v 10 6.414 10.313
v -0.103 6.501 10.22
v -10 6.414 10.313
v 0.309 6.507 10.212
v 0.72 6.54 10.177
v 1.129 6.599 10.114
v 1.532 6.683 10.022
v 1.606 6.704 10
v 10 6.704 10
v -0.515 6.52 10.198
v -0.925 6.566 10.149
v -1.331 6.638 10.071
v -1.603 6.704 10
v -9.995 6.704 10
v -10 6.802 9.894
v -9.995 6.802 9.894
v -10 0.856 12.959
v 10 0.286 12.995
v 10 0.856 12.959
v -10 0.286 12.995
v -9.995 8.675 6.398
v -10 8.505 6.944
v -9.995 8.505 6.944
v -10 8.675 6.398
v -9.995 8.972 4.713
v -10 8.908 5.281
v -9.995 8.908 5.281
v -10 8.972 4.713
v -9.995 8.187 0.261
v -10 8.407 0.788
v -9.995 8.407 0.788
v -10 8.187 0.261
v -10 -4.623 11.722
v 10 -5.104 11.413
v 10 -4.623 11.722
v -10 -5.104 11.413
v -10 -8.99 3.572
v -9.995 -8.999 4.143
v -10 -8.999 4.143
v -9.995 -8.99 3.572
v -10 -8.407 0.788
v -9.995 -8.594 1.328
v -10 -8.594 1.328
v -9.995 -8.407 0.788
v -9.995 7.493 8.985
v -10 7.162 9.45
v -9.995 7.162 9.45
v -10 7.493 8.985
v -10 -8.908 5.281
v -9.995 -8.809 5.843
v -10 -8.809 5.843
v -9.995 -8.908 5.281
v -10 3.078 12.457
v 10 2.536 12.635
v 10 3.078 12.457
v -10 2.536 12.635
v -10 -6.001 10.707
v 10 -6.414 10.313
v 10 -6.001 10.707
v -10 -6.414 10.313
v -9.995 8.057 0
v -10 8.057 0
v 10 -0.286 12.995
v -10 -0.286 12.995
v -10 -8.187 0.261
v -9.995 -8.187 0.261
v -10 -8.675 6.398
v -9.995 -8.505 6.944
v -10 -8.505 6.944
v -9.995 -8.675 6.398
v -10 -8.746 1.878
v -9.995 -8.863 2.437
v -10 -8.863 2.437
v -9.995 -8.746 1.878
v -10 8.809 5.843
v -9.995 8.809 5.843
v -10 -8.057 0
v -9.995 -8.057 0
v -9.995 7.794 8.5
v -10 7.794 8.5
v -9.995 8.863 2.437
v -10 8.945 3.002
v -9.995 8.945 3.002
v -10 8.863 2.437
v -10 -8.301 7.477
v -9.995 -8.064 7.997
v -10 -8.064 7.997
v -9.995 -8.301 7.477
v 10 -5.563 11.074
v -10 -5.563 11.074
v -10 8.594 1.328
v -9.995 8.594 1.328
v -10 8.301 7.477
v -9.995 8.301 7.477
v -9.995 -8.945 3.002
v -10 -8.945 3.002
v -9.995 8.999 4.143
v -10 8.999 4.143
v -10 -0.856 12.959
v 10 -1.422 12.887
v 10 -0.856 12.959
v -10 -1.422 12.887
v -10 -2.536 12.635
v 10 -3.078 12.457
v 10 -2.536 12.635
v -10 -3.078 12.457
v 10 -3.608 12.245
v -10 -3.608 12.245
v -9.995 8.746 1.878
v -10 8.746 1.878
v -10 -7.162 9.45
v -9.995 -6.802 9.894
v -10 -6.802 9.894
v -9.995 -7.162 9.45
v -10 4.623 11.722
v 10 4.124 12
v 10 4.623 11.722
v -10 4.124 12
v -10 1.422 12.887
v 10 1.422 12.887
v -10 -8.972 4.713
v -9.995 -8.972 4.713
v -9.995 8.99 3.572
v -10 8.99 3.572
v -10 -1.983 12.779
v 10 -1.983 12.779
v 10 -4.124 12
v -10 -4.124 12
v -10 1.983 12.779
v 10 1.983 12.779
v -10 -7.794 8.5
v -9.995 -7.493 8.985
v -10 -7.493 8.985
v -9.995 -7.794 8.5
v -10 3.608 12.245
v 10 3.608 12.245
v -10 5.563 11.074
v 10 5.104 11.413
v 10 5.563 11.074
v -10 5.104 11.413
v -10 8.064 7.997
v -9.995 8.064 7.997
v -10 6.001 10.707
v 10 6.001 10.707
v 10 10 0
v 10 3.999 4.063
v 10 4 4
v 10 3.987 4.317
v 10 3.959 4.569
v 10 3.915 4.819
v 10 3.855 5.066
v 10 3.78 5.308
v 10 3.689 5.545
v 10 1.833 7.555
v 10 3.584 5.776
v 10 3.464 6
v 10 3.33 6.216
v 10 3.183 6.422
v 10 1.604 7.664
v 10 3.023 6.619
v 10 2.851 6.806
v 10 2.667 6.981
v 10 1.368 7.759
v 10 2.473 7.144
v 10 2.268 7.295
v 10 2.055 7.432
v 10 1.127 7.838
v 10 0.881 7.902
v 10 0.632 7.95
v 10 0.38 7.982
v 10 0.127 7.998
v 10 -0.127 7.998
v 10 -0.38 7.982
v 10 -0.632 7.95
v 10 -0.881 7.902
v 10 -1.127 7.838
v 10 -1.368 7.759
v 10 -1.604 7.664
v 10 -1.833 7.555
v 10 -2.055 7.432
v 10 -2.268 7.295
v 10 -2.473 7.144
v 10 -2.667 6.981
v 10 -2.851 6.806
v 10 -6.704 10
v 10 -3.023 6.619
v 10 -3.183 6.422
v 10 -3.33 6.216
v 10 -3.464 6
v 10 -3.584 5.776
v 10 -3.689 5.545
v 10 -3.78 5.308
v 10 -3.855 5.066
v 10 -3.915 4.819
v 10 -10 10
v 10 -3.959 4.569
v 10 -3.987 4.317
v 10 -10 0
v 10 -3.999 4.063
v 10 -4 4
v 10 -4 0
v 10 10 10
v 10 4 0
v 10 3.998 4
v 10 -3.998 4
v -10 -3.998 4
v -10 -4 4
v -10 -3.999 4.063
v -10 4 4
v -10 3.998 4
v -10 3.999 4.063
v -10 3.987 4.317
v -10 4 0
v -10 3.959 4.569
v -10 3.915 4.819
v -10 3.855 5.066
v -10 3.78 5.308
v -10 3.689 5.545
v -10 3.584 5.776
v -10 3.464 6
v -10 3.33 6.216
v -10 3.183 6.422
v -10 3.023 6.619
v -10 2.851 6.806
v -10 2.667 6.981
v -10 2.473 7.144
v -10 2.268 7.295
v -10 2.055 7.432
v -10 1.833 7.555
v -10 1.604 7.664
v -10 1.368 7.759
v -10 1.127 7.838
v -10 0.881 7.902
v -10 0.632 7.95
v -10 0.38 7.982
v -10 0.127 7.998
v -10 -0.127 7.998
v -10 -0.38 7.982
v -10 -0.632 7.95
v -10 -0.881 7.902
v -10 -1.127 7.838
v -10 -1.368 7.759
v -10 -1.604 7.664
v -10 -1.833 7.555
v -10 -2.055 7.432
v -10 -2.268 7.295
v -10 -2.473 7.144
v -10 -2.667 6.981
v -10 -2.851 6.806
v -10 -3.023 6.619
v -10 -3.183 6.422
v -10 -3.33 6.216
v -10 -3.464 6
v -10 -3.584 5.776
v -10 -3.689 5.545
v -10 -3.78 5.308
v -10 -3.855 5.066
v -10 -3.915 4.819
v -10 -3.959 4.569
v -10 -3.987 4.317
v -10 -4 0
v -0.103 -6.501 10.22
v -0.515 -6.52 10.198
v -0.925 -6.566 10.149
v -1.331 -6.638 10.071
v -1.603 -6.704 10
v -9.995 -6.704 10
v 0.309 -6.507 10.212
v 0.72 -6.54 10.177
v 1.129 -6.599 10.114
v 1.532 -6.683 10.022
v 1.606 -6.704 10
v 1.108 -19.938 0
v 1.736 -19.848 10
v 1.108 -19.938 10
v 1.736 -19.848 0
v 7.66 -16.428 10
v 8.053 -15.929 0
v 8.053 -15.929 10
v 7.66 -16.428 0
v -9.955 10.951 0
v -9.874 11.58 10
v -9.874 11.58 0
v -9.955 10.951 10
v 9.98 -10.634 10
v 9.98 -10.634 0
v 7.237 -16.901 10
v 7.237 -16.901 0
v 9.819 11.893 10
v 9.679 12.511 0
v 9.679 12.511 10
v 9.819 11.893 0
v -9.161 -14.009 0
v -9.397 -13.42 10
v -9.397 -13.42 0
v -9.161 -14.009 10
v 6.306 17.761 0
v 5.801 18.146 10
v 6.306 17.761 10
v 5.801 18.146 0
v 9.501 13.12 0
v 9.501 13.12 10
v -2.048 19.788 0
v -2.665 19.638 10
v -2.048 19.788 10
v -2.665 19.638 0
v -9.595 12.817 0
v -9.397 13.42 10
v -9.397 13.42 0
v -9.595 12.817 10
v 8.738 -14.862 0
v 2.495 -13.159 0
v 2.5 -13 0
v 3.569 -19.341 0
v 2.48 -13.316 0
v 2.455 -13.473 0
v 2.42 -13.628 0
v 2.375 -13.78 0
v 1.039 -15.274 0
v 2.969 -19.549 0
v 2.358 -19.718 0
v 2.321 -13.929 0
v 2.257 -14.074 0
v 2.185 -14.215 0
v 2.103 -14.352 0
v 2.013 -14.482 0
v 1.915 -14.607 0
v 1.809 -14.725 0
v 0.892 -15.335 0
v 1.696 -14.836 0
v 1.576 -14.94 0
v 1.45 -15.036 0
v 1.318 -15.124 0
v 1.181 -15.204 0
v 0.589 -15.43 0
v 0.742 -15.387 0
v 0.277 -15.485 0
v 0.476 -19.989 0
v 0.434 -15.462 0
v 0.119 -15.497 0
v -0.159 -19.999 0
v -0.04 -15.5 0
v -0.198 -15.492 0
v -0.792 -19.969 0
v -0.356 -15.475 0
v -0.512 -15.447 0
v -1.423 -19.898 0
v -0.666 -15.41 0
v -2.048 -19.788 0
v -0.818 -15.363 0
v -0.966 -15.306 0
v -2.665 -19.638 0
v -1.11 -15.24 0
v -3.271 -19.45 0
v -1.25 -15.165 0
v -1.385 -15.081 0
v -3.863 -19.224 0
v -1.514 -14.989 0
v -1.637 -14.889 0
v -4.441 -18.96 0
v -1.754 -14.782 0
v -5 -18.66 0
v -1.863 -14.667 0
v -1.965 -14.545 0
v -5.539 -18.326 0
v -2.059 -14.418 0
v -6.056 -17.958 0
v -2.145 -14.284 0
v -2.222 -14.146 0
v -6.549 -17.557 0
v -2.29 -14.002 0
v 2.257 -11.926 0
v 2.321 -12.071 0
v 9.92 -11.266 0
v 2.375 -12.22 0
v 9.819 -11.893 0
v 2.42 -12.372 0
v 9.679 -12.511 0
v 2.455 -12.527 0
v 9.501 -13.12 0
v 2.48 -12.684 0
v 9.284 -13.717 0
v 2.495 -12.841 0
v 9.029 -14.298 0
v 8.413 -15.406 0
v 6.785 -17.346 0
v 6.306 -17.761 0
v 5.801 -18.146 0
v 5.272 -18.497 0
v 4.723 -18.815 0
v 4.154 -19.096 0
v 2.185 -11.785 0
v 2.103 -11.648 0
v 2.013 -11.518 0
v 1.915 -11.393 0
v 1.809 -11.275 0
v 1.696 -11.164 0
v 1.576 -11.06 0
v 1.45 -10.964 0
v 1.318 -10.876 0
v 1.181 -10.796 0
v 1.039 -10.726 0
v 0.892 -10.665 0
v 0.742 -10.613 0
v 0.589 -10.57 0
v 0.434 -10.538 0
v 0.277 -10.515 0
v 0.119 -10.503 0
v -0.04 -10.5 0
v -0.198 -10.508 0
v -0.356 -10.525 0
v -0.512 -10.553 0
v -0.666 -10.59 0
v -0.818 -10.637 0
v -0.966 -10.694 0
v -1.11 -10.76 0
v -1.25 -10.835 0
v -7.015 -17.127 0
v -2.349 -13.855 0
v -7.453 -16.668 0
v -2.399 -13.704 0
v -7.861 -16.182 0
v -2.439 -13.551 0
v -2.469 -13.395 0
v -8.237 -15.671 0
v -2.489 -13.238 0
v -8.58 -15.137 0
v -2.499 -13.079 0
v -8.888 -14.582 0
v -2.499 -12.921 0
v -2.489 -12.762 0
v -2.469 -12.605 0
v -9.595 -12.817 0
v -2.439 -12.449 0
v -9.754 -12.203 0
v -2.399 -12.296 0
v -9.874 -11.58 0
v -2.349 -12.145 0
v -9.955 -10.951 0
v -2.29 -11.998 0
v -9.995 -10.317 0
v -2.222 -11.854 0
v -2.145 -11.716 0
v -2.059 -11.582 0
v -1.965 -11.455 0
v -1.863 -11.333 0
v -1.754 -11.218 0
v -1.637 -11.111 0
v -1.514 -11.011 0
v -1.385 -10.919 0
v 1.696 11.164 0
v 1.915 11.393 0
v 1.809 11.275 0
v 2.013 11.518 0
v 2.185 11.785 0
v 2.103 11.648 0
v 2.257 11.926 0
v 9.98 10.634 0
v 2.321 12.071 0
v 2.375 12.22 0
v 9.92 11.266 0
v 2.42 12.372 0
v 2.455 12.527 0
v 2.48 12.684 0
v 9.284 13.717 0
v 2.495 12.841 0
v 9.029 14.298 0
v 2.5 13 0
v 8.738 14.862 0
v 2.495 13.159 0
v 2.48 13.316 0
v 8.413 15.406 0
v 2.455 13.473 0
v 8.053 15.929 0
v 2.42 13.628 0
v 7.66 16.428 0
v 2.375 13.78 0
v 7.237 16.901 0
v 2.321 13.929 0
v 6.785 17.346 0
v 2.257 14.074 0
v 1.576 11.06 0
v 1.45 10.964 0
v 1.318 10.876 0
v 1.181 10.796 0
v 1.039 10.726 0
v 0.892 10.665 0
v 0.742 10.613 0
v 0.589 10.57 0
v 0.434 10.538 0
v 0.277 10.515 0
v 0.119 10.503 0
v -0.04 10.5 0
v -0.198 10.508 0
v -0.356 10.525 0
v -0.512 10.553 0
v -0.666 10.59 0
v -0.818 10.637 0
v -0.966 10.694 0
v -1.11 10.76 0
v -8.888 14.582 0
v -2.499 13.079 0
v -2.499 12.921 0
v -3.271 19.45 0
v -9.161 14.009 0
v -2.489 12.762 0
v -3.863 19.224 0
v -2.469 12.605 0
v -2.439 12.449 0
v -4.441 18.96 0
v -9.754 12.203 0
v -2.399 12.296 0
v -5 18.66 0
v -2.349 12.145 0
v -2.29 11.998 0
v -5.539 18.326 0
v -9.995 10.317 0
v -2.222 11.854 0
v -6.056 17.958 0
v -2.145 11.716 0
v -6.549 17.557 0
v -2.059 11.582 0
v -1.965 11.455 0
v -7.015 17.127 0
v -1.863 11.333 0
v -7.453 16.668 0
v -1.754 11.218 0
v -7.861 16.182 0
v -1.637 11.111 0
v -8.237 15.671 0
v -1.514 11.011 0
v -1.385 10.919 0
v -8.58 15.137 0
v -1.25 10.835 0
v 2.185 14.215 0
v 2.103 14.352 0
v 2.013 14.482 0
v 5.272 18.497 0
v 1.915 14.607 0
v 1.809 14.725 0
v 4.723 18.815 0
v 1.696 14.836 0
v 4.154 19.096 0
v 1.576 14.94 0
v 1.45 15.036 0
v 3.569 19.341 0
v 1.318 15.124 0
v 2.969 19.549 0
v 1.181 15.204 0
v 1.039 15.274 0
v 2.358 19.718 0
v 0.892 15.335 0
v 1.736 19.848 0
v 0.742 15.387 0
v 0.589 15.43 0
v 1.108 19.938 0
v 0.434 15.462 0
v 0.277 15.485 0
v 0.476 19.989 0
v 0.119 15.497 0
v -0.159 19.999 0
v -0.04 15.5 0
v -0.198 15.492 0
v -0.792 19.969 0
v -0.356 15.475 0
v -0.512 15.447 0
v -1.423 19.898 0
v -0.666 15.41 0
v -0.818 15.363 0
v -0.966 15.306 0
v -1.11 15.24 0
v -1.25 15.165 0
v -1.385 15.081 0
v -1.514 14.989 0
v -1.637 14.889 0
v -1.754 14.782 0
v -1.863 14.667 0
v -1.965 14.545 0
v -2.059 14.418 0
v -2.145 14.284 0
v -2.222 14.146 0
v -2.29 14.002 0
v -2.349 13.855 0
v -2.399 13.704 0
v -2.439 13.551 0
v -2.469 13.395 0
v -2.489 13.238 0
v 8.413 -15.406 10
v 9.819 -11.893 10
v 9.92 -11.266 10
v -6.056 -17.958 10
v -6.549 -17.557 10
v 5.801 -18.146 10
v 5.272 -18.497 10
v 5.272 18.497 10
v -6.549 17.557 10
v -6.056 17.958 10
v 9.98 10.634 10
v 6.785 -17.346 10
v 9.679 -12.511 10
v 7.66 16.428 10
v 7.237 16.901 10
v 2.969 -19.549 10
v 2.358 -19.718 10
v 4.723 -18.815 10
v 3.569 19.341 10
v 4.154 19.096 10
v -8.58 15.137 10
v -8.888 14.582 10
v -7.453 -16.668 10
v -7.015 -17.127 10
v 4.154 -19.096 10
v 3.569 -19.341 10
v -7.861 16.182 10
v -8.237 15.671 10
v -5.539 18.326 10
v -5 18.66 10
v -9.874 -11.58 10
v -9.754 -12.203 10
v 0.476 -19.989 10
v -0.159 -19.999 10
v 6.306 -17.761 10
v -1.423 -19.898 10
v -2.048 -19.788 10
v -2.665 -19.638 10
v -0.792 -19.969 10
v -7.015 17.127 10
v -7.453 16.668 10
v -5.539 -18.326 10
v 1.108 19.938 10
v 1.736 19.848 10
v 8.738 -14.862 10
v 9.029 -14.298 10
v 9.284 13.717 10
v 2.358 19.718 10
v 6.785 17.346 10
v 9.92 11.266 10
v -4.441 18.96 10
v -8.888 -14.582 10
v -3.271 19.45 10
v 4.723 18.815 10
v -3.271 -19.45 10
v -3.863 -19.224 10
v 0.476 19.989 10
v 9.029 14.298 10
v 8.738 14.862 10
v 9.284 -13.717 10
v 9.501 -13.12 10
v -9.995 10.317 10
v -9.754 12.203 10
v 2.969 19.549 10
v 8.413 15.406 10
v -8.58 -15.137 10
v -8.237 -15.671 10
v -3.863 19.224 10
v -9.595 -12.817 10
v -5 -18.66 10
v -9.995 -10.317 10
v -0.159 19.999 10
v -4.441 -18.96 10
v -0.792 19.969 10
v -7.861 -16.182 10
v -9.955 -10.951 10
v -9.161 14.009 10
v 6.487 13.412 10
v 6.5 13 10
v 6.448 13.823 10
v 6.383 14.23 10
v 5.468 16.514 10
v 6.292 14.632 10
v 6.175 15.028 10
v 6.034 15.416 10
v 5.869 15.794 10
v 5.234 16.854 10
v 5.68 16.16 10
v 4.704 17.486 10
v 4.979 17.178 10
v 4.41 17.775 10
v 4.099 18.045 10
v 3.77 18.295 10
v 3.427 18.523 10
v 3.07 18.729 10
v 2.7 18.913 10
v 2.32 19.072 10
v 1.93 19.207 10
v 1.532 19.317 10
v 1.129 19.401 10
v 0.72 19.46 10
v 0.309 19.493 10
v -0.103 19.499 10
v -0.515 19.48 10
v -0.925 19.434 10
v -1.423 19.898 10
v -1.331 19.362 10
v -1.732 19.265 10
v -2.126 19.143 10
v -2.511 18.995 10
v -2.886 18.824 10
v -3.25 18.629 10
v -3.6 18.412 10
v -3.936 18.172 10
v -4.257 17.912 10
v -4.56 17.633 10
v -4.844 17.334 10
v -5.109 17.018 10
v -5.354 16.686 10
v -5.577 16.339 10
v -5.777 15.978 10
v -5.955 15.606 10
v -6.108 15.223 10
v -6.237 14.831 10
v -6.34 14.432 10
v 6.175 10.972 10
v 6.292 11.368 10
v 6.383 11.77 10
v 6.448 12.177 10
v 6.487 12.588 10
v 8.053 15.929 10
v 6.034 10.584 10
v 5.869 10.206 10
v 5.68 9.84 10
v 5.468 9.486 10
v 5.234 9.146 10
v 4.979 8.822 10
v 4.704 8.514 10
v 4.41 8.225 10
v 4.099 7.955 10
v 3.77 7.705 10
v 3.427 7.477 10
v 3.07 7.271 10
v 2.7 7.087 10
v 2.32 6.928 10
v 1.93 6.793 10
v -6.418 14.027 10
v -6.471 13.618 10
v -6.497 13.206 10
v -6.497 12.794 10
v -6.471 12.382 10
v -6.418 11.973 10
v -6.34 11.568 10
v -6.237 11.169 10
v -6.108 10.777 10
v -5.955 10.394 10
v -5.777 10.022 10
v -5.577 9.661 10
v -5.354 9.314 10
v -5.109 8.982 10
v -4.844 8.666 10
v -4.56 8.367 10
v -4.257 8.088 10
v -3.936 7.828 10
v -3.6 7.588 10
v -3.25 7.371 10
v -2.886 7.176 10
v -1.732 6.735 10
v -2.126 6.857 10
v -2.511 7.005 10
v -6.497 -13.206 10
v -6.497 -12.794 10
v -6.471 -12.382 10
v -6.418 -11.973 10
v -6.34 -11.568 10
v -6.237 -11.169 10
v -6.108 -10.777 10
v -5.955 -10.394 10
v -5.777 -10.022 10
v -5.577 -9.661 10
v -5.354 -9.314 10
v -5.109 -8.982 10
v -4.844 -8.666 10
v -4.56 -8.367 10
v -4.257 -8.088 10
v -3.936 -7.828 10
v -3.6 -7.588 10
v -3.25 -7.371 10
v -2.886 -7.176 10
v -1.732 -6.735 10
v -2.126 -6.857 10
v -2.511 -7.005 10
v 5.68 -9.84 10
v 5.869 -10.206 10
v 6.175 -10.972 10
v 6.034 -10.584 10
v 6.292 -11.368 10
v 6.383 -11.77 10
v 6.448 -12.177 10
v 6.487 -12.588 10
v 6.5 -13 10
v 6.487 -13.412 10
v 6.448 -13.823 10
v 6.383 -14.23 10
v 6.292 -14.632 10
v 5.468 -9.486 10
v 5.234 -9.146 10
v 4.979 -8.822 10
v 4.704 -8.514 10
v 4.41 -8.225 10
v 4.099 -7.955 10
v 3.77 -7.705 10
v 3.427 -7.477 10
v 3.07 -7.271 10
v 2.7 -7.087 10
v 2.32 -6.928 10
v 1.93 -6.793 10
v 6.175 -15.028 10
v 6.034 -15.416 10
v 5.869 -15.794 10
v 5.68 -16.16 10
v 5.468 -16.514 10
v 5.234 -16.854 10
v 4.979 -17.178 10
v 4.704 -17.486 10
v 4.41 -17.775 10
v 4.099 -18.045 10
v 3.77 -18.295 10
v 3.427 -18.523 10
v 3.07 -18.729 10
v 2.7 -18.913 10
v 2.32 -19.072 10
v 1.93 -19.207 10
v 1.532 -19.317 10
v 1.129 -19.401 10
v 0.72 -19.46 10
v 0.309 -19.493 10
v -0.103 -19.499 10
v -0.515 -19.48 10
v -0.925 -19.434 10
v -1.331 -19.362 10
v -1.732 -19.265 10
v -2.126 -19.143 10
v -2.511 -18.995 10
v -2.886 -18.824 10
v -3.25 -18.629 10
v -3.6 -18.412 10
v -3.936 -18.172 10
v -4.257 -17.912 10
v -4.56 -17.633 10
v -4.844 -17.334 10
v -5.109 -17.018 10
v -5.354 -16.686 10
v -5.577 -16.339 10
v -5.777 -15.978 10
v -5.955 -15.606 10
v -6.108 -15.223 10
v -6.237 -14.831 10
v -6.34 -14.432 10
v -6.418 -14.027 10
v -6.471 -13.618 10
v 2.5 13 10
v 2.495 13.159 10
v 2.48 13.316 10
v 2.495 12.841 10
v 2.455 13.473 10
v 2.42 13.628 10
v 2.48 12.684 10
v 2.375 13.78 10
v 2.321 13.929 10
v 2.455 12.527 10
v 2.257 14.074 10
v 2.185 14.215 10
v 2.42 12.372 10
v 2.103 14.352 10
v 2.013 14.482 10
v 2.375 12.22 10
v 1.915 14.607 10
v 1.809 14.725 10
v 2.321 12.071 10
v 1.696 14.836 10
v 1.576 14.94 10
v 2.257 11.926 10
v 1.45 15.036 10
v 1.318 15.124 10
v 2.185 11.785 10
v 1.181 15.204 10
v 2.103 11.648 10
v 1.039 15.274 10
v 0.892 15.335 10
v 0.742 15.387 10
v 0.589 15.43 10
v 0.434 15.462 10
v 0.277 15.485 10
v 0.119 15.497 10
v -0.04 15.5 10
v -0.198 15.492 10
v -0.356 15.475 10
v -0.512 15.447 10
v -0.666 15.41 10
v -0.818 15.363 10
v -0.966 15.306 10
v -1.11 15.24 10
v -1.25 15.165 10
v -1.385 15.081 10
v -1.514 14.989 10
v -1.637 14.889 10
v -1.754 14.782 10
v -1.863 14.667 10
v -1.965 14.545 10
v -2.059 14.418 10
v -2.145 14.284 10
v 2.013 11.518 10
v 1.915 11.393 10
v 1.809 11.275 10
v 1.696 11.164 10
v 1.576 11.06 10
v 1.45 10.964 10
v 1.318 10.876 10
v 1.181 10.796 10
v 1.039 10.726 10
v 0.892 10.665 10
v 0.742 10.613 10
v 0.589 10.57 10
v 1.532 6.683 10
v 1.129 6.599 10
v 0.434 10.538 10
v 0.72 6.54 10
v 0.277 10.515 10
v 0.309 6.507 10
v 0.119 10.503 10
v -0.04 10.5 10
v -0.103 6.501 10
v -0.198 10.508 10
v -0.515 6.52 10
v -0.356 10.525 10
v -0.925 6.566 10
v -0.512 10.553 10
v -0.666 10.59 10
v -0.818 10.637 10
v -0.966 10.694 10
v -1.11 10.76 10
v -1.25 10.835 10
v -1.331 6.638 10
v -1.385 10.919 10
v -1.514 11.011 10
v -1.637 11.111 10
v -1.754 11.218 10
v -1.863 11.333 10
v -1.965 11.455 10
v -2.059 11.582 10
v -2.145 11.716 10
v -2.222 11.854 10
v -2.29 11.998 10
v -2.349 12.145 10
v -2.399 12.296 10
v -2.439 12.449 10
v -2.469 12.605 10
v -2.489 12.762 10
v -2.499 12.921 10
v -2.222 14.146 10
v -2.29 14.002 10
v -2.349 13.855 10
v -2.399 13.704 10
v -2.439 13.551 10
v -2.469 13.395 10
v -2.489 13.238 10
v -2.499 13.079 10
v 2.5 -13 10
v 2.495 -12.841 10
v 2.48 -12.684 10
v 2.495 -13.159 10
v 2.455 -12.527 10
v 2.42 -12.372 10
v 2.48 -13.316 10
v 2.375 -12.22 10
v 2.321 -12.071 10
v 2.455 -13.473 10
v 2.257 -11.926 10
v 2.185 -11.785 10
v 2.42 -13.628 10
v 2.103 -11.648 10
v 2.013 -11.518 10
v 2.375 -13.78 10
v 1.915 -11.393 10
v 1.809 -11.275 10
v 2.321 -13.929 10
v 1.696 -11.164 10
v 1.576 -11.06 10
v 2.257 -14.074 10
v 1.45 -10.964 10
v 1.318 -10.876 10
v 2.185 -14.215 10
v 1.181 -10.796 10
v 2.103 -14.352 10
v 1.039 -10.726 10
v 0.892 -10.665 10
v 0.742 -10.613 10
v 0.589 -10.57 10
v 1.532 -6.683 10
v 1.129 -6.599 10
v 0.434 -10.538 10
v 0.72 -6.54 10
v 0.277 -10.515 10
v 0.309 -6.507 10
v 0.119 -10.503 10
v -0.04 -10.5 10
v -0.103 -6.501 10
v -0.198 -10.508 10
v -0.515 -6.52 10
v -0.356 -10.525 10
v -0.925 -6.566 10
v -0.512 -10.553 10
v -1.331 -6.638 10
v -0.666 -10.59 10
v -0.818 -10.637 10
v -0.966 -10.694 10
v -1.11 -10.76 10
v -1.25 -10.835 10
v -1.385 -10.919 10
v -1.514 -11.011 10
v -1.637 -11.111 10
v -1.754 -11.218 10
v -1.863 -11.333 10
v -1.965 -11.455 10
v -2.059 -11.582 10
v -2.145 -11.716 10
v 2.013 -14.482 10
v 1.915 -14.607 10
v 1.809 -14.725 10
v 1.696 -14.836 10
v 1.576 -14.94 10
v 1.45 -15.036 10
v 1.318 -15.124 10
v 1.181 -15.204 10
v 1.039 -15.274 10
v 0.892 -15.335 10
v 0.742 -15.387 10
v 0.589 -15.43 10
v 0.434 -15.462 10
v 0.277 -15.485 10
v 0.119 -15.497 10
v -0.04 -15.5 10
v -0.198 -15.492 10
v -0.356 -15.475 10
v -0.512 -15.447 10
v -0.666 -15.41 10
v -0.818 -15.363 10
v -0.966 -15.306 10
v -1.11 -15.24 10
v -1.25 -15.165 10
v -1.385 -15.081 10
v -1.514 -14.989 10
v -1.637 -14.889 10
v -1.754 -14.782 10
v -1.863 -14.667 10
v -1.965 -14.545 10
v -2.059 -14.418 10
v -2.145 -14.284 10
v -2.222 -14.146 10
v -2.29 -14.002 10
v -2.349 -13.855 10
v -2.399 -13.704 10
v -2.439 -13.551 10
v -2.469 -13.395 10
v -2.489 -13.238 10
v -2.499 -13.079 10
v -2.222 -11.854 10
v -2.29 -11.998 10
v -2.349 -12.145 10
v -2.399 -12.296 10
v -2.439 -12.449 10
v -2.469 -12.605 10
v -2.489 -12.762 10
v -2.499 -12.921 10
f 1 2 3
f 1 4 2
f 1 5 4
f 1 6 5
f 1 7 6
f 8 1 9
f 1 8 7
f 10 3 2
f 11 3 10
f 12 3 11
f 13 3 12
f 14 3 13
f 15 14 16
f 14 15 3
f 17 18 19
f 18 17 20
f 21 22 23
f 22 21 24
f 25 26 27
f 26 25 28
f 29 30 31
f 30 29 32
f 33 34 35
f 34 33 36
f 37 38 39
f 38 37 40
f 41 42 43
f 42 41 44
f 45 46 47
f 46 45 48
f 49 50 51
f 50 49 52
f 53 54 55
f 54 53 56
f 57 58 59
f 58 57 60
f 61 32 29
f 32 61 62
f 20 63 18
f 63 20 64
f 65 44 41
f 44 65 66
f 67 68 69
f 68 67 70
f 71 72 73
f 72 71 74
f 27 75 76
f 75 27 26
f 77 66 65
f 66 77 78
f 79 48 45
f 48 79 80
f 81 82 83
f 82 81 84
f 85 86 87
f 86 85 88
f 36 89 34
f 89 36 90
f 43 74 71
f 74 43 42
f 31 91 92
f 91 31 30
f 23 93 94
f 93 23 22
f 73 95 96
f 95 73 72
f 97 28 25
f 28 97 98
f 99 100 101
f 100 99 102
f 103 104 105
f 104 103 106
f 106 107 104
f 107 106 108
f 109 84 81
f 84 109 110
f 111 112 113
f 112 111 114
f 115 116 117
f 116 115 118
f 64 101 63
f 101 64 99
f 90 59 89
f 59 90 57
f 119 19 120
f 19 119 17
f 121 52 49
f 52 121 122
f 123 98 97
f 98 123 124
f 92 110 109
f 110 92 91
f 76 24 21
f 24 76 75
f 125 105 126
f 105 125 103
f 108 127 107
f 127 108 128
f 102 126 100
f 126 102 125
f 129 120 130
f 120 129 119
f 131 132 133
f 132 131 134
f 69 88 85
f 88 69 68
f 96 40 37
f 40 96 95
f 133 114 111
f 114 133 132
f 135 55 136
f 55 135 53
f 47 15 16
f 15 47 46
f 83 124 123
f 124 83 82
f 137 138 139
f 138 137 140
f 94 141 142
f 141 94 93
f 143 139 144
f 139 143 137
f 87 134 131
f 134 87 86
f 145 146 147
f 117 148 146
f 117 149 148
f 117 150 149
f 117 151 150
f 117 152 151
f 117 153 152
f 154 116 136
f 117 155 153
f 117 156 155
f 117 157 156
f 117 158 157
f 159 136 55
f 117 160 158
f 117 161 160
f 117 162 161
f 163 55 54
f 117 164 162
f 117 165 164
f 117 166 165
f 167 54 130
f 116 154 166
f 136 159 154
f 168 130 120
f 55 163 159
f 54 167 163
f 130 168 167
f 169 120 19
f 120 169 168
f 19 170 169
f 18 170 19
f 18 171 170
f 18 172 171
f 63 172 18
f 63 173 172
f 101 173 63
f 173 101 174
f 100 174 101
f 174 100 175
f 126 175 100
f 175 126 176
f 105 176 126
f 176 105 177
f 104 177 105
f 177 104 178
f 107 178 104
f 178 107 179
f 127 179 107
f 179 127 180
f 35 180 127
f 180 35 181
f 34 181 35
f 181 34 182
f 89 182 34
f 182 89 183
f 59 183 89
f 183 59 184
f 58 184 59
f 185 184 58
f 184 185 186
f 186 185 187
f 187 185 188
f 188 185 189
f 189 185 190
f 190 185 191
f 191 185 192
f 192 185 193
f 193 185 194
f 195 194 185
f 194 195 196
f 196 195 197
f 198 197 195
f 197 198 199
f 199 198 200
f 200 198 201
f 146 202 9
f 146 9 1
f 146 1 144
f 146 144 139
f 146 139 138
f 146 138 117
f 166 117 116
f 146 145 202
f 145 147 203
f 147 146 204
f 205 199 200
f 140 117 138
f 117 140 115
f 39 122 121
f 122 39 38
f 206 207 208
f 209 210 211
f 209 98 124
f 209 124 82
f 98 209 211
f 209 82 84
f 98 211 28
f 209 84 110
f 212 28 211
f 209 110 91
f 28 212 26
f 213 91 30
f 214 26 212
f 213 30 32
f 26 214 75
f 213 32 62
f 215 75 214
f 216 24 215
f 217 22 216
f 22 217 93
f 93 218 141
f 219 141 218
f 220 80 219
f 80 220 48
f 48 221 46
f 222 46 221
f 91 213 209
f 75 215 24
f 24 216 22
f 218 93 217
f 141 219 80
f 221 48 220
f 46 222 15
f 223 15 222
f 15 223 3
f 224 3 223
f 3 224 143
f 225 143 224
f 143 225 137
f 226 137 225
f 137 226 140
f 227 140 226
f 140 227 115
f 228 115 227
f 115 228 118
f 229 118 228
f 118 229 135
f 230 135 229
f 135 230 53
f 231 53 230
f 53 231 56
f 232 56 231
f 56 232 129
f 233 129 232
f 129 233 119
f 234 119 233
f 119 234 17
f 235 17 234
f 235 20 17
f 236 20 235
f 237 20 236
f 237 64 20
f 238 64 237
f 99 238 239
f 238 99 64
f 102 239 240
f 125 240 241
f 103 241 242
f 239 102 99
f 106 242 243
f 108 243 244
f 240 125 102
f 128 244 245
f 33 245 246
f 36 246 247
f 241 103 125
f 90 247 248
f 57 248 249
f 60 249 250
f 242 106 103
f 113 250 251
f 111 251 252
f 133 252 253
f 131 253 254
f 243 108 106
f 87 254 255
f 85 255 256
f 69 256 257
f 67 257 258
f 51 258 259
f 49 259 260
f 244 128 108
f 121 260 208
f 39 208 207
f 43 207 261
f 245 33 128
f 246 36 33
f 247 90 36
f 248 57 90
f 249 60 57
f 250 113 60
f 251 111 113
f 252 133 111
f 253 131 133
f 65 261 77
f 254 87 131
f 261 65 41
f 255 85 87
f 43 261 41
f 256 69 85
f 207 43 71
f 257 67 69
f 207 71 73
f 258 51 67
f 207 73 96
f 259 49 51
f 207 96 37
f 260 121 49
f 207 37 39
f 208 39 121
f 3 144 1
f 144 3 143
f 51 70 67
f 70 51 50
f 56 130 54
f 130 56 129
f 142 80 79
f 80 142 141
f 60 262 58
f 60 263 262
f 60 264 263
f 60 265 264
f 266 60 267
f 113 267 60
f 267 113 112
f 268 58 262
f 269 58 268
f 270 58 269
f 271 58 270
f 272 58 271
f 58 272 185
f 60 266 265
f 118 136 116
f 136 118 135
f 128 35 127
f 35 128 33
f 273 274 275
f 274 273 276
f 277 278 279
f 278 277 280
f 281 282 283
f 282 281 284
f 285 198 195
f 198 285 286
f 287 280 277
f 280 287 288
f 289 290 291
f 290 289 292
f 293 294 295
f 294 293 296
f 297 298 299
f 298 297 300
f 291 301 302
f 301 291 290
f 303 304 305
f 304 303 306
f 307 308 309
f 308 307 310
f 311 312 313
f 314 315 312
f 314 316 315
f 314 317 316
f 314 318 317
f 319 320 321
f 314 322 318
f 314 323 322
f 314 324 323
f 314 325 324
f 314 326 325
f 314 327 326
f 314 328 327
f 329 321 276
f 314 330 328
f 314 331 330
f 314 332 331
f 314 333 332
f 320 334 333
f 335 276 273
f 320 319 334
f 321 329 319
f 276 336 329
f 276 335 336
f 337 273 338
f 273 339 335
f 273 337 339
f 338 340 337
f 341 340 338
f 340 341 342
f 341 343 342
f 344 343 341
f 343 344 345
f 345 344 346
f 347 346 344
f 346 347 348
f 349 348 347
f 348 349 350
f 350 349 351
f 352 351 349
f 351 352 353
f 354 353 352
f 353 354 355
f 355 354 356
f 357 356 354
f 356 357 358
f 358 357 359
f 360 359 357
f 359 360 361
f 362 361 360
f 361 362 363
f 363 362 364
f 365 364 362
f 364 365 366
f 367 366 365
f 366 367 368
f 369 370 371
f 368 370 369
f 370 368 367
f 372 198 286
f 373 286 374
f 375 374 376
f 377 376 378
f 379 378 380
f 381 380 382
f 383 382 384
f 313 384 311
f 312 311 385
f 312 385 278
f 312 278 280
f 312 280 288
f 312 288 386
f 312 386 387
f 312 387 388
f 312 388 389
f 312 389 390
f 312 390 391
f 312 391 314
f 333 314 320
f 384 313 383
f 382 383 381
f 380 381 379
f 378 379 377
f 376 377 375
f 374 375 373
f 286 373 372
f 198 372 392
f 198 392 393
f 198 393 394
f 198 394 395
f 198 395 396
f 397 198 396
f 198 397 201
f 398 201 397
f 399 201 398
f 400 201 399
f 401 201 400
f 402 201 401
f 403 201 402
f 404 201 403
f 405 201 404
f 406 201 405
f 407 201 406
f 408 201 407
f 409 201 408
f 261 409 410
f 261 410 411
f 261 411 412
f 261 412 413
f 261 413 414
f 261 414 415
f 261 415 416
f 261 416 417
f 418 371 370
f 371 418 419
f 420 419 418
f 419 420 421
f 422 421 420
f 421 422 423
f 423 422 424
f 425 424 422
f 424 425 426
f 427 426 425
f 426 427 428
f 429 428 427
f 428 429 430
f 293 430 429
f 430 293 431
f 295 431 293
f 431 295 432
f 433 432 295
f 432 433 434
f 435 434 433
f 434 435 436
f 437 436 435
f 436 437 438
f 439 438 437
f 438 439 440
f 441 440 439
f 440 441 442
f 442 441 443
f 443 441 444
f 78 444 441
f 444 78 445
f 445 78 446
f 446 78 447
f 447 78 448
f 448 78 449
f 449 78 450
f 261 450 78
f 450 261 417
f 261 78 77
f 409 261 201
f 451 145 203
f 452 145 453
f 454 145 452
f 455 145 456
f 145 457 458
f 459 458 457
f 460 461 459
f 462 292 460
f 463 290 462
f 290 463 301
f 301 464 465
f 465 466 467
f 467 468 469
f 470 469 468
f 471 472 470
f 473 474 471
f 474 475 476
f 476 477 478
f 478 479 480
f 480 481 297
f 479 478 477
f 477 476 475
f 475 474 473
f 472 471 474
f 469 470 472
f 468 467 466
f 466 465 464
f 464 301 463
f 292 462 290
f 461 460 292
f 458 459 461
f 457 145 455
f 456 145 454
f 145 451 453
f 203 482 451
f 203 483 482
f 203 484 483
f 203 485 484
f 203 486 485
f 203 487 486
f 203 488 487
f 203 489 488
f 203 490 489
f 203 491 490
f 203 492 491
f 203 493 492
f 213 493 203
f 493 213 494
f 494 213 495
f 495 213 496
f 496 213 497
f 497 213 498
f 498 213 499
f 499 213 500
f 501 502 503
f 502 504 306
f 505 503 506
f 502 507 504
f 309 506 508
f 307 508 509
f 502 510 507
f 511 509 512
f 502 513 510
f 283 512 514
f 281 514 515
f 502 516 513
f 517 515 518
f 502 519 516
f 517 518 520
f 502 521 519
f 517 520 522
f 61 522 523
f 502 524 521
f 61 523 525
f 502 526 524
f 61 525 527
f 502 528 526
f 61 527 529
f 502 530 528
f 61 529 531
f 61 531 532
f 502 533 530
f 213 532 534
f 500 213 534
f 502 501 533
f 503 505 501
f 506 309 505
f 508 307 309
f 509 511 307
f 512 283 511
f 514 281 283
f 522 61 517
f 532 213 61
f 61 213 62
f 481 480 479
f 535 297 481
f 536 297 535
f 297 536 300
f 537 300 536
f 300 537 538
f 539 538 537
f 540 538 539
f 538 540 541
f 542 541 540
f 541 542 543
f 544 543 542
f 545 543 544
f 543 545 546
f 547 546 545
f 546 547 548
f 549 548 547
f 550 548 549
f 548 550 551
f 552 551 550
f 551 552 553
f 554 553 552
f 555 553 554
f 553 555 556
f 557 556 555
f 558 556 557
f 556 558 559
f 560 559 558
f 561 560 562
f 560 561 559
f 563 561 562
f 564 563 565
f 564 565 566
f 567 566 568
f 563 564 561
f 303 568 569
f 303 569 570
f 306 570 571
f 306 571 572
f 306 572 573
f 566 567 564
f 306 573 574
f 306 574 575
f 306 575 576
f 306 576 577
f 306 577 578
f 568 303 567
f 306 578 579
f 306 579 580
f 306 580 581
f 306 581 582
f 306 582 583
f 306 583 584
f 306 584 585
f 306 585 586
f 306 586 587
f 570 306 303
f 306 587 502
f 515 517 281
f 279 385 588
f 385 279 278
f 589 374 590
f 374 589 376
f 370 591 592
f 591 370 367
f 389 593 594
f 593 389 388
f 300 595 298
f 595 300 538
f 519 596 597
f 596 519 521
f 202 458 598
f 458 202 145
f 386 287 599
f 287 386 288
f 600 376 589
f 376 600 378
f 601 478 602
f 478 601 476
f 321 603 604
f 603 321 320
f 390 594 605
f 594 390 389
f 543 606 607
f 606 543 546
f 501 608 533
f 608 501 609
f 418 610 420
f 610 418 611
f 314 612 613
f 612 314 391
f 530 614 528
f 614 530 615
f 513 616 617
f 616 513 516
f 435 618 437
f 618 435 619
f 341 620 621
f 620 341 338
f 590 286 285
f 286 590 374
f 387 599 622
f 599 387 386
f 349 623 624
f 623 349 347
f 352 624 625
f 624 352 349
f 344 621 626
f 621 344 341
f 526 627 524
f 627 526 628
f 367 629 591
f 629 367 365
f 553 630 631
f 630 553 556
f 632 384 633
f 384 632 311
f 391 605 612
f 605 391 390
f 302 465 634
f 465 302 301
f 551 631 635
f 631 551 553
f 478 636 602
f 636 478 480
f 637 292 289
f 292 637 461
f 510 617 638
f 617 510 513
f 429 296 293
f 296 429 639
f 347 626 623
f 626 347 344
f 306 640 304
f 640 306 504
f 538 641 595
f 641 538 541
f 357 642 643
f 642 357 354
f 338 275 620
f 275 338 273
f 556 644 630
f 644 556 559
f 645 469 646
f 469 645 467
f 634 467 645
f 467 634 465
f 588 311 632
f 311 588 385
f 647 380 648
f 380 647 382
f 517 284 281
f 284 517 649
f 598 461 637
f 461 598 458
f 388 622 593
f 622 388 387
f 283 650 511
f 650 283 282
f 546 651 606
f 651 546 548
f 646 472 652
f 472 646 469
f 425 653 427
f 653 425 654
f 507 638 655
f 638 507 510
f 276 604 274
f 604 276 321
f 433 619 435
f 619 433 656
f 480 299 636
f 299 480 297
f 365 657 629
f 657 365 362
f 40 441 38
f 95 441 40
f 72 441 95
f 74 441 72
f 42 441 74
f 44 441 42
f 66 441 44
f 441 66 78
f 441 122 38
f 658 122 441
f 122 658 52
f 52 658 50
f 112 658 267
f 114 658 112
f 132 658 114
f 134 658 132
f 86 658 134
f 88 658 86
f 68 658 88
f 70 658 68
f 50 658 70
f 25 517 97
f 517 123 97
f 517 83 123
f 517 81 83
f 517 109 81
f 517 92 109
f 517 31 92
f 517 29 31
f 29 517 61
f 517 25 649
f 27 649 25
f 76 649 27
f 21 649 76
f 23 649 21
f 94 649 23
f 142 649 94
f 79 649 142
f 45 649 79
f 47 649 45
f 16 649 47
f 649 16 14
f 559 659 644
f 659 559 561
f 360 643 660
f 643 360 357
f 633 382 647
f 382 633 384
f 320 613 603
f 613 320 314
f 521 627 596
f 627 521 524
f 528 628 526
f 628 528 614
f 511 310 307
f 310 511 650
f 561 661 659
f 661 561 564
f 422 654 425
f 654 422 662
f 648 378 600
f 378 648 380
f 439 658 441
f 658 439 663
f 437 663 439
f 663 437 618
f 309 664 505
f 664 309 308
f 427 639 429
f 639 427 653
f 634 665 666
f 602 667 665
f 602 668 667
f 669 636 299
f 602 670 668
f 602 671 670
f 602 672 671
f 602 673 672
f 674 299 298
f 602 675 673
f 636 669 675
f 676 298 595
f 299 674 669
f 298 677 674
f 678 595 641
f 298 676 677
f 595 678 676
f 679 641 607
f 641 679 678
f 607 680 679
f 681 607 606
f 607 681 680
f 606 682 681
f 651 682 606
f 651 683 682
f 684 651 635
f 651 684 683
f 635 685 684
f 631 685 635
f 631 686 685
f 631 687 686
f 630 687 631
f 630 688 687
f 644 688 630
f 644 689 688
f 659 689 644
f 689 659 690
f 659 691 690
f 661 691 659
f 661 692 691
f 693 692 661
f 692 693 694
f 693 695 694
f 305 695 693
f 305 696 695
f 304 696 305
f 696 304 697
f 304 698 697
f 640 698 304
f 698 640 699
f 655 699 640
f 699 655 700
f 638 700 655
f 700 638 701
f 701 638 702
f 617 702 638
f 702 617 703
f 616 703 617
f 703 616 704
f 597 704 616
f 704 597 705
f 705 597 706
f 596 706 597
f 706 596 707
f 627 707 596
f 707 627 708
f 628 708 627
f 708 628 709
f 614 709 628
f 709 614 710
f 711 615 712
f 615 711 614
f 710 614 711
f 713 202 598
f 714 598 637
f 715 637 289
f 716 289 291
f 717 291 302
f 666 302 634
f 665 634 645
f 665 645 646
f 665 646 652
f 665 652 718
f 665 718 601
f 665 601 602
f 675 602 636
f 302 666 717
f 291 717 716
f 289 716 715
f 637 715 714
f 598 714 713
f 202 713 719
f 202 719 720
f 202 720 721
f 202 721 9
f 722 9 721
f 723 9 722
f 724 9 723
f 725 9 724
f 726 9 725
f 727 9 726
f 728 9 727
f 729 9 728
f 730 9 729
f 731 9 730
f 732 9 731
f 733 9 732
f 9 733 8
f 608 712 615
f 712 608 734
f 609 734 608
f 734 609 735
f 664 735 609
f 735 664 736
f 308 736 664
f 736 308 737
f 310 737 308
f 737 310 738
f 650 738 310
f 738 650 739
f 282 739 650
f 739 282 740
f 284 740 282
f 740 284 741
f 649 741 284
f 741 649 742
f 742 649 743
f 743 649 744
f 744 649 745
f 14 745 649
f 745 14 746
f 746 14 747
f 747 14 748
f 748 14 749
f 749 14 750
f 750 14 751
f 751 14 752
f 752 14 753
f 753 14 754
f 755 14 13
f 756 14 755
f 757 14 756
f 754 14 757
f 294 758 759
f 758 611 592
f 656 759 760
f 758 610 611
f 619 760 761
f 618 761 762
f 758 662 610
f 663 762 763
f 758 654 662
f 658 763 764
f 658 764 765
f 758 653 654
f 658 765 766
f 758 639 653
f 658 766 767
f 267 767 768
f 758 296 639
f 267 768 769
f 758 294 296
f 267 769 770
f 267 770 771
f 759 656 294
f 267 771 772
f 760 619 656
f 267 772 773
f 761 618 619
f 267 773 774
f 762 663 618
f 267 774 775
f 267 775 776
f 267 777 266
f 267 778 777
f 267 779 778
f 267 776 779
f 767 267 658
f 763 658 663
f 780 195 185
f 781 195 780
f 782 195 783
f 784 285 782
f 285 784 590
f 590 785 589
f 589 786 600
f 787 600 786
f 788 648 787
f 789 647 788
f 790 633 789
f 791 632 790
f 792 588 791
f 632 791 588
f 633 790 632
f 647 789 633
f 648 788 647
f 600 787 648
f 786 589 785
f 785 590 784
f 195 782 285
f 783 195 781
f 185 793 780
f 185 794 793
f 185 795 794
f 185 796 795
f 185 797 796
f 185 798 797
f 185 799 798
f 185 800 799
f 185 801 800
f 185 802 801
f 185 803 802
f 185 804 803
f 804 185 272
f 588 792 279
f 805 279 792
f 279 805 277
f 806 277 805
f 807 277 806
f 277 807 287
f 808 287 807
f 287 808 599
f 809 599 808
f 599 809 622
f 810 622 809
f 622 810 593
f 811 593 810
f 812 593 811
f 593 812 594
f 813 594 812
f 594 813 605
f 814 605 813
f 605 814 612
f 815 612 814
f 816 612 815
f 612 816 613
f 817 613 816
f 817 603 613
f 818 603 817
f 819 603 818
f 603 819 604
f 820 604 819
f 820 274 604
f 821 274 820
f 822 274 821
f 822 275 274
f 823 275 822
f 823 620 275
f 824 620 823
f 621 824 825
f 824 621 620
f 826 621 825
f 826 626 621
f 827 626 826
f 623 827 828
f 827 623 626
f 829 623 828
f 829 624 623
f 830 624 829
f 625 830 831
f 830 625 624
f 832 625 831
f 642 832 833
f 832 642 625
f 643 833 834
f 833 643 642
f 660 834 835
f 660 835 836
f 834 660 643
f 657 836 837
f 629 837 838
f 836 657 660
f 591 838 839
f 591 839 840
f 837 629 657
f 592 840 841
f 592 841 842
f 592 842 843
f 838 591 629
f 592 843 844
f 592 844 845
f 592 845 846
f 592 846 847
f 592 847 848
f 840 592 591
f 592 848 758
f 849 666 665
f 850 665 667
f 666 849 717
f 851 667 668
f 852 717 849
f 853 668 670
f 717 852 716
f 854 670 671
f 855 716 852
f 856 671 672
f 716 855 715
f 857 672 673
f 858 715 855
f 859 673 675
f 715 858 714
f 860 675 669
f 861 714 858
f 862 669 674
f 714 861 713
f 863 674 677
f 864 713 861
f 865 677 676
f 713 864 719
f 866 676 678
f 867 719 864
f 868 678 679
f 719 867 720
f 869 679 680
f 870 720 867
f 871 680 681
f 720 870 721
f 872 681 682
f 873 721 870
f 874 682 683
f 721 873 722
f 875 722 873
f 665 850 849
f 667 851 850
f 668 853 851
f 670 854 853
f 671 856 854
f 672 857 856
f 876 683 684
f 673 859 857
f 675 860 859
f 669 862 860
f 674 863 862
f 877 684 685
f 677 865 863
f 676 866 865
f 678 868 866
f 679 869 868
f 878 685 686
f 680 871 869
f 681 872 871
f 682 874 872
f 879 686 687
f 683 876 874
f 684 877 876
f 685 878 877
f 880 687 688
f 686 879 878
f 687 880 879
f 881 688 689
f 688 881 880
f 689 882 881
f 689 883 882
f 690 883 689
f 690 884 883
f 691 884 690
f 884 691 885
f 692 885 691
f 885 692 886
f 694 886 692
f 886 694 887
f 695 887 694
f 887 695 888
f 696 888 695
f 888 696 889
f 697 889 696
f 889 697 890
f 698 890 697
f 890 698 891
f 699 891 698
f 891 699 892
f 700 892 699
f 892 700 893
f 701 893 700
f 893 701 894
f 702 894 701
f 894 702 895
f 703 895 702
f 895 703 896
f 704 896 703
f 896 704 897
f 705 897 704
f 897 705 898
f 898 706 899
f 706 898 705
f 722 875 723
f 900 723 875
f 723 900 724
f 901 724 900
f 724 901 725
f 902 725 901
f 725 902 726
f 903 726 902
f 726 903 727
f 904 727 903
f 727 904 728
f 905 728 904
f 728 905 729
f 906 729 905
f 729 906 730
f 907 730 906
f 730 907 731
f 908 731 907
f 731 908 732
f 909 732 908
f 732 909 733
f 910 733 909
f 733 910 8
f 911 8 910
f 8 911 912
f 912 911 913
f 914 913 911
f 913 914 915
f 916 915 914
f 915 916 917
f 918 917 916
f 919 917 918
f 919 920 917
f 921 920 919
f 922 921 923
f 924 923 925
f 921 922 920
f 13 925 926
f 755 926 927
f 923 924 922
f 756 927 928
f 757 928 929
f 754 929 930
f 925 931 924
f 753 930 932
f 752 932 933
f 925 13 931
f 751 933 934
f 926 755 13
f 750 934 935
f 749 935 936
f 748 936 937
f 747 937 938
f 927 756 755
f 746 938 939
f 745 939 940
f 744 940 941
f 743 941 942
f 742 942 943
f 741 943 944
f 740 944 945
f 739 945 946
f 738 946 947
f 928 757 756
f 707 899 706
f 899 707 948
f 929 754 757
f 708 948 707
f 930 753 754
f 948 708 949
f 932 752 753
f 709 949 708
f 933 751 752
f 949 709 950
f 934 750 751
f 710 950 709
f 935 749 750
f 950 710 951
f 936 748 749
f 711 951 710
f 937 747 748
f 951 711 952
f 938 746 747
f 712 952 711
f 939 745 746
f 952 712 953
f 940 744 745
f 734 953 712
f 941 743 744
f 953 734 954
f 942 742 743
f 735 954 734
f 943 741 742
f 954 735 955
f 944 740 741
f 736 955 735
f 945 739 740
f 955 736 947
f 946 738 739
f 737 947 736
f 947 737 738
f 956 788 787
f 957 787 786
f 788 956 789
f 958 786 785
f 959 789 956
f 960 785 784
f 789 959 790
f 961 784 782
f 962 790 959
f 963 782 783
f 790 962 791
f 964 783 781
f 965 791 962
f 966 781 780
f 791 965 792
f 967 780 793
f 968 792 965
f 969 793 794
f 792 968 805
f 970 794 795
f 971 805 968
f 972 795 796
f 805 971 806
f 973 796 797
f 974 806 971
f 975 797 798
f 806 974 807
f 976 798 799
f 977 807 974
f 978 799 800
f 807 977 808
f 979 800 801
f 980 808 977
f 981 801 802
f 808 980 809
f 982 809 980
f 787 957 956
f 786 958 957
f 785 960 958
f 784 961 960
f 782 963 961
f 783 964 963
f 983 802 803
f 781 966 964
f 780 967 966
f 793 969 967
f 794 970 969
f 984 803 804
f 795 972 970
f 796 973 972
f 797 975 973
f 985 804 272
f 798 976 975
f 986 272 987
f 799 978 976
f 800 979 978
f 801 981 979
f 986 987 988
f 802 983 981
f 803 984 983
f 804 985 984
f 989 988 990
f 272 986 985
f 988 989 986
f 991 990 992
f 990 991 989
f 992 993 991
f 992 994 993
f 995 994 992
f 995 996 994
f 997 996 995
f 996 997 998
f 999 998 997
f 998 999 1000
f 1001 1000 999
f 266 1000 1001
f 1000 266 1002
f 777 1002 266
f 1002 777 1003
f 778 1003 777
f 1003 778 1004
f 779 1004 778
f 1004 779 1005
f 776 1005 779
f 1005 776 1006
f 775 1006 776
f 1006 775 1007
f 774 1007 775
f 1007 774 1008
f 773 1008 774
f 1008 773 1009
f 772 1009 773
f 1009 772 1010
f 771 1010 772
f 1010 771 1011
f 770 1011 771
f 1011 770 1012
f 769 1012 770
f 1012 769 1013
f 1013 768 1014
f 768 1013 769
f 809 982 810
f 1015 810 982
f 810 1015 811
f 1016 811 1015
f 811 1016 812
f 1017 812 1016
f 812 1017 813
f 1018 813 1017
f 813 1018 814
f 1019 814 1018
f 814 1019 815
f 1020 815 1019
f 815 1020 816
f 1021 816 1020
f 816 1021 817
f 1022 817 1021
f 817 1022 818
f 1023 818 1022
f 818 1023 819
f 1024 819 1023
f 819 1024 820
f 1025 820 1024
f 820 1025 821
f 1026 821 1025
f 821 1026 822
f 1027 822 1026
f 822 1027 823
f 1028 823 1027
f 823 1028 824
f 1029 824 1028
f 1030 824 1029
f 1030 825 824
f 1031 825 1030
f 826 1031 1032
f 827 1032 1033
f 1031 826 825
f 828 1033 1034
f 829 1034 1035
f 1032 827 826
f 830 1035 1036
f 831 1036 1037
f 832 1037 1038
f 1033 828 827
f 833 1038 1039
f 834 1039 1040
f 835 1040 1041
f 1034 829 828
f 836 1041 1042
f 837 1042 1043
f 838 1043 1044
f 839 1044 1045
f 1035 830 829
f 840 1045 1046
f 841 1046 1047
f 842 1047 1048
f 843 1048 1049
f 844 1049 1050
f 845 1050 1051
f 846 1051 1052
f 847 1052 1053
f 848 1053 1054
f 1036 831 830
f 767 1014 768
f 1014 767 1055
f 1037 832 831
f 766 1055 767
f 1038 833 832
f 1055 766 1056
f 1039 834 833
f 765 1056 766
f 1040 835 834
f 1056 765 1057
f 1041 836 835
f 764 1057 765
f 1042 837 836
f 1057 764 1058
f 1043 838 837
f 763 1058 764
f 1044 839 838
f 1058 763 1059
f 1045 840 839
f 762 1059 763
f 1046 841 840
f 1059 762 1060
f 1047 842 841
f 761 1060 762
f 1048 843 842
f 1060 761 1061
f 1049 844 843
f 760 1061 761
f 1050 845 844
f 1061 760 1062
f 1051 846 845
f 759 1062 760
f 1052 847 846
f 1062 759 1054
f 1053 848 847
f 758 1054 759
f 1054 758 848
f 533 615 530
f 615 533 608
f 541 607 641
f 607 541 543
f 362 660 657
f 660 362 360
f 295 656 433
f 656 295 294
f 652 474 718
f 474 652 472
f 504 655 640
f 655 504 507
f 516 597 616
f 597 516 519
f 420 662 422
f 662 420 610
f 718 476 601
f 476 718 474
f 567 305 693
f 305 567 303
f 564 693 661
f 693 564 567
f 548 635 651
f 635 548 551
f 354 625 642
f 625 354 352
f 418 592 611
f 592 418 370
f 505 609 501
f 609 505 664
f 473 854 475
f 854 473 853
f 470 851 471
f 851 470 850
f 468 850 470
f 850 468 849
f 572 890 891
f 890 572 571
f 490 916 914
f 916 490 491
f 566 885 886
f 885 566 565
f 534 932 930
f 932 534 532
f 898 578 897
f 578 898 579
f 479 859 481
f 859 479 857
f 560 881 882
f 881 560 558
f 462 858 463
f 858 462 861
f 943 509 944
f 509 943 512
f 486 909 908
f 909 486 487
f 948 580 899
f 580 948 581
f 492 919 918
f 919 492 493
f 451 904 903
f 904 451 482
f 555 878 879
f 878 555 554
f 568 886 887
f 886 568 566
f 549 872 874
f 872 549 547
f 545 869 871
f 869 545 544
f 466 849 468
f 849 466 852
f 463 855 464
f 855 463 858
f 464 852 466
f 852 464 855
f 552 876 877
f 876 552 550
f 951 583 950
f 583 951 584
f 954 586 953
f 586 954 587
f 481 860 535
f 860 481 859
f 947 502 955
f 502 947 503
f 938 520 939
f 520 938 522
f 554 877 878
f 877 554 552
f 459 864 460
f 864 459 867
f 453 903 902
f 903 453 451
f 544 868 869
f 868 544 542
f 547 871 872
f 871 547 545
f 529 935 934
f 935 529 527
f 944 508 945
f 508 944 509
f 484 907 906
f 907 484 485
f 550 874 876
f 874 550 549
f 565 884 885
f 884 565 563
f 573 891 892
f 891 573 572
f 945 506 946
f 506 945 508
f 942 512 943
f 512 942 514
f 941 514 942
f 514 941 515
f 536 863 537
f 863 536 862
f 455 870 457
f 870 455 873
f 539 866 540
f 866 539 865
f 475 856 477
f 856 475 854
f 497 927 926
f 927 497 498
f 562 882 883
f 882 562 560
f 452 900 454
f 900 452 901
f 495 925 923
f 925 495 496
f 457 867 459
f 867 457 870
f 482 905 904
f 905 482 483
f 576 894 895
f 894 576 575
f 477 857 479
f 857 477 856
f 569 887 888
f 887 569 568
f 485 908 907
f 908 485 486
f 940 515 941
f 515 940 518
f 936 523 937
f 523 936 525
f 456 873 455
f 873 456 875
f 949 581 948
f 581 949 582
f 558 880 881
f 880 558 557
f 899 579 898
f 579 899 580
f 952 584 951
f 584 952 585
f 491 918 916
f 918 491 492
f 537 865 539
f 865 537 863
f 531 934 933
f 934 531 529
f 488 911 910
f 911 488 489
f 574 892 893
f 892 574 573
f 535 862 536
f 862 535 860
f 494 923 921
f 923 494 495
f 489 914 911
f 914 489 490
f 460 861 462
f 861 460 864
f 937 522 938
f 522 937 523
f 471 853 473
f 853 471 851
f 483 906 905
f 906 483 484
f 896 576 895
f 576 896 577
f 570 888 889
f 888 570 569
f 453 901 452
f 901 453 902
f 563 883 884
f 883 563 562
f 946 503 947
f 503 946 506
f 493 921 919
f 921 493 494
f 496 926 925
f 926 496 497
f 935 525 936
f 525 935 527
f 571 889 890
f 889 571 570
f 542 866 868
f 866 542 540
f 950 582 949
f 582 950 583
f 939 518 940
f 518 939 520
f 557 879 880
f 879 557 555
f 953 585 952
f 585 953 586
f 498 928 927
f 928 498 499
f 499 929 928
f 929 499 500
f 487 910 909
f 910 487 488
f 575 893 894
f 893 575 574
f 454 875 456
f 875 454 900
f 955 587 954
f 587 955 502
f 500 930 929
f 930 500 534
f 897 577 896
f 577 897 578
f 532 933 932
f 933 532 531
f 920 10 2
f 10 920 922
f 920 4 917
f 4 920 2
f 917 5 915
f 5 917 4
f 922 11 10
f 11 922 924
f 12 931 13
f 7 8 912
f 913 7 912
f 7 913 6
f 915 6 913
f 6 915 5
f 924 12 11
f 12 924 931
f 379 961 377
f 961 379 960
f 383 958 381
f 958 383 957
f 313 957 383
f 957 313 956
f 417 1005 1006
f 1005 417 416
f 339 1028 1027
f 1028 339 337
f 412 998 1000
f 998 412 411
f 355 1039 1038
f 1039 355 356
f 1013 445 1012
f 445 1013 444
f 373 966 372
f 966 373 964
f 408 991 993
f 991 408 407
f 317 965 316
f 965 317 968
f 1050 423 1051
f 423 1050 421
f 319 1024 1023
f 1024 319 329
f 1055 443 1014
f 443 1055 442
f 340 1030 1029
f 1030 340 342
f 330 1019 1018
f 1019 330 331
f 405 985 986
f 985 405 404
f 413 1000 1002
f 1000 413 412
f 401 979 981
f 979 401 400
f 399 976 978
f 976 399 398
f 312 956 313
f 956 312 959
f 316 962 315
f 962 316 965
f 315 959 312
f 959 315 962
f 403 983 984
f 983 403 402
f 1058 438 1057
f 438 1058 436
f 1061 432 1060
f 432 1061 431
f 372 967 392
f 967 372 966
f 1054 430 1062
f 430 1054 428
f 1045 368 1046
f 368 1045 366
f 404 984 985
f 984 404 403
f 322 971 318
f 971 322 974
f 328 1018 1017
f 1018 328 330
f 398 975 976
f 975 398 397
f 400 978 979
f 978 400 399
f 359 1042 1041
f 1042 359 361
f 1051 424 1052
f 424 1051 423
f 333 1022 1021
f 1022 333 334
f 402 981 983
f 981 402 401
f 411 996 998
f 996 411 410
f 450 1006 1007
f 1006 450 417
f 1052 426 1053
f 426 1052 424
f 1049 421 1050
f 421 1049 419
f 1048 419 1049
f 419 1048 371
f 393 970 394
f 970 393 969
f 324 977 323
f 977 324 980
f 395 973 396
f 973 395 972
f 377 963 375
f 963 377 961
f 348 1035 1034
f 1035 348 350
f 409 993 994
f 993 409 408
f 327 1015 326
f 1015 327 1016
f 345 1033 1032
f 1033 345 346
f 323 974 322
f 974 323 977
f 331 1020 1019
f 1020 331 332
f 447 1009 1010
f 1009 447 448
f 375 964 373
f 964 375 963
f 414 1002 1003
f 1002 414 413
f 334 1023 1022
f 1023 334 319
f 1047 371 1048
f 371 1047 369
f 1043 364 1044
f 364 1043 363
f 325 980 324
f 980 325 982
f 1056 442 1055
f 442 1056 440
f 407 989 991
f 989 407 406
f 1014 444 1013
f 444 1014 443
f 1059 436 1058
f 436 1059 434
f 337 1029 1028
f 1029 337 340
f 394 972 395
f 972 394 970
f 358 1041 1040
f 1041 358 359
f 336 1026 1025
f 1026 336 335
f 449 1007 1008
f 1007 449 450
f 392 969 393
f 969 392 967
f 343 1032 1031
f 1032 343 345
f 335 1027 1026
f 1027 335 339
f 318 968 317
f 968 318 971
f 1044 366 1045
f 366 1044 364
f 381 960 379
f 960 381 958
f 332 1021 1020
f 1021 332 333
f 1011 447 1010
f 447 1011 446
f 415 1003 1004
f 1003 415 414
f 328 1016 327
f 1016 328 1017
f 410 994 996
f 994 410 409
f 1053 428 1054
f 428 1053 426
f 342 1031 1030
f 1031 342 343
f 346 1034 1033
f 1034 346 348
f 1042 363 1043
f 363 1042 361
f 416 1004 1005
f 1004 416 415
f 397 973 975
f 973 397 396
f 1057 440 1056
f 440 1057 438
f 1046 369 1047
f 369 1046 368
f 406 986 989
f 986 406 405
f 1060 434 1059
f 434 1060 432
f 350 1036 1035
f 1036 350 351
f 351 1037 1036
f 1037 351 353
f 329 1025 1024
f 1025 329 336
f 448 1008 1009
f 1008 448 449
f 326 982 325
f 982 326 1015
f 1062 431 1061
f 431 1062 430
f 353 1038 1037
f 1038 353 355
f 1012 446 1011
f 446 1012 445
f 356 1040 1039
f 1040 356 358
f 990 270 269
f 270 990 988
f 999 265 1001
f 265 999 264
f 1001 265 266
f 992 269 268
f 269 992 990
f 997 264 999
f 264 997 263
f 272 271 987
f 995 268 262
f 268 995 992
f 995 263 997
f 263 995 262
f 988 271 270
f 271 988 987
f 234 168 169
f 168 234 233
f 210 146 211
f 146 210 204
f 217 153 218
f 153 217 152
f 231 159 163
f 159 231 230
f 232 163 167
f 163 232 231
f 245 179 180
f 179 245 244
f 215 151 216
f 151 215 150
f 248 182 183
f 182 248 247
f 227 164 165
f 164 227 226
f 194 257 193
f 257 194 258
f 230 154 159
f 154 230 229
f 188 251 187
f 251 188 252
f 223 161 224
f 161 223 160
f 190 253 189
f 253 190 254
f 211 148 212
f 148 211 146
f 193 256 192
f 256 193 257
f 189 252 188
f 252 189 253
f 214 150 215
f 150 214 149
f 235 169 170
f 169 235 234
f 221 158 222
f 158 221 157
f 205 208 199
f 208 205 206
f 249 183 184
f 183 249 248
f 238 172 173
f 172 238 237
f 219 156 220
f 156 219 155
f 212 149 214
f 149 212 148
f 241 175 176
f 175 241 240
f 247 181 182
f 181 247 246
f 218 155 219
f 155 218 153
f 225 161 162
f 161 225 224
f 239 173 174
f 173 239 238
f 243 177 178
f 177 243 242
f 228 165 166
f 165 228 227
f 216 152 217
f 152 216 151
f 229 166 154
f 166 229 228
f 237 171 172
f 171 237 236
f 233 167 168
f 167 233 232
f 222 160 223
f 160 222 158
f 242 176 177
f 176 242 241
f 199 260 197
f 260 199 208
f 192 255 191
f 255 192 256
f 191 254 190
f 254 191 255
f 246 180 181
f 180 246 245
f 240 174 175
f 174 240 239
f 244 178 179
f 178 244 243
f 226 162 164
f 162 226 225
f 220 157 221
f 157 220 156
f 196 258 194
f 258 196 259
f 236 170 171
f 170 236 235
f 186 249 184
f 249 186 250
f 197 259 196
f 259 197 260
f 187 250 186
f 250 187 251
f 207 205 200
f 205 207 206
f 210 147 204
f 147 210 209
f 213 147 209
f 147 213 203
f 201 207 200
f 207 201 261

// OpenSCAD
// file: bolt.scad
include <configuration.scad>;

module bolt(){
	union(){
		translate([0, 0, -boltLength]) cylinder(r=boltOuterRadius, h=boltLength+1);
		cylinder(r=washerOuterRadius, h=washerLength);
	}
}

// a bolt and washer intended for making equivalent holes
// the parameter from indicates which side the bolt is inserted from
module boltWasher(from="x-"){
	if(from=="x+"){
		rotate([0, 90, 0]) bolt();
	} else
	if(from=="x-"){
		rotate([0, -90, 0]) bolt();
	} else
	if(from=="y+"){
		rotate([-90, 0, 0]) bolt();
	} else
	if(from=="y-"){
		rotate([90, 0, 0]) bolt();
	} else
	if(from=="z+"){
		rotate([0, 0, 0]) bolt();
	} else
	if(from=="z-"){
		rotate([180, 0, 0]) bolt();
	}
}

boltWasher("x-");
// file: configuration.scad
// Copyright (C) 2012 t00tie
// Adapto is licensed under the Creative Commons - GNU GPL license.
// http://creativecommons.org/licenses/GPL/2.0/

// Configuration file for Adapto OpenSCAD files

boltOuterRadius=5/2;// outer radius of bolt threads, 5 for M5 bolts
boltLength=60;//bolt length without head (threaded part only)
washerOuterRadius=13/2;// washers that fit the bolts
washerLength=10;// this is large because it is used to make holes for washers

frameX=20;// width of frame parts (alu, wood etc.)
frameY=20;// ditto

boltOffset=frameX/2;// How far in the bolt holes go, may need tweaking if framX!=frameY

smoothRod=8;// diameter of smooth rods


// Copied from 
// PRUSA Mendel  
// Default metric sizes
// GNU GPL v3
// Josef Průša
// josefprusa@me.com
// prusadjs.cz
// http://www.reprap.org/wiki/Prusa_Mendel
// http://github.com/prusajr/PrusaMendel
m3_nut_diameter = 5.3;
m3_nut_diameter_bigger = ((m3_nut_diameter  / 2) / cos (180 / 6))*2;
// main file
// Copyright (C) 2012 t00tie
// After an stl designed by RoTorIT
// Adapto is licensed under the Creative Commons - GNU GPL license.
// http://creativecommons.org/licenses/GPL/2.0/

include <configuration.scad>;
use <bolt.scad>;

$fn=99;
thickness=5;
width=frameX;

// render the parts
yRodClamp(recess=false);
//translate([2*width, 0, 0]) yRodClamp(recess=false);
//translate([2*width, 3*width, 0]) yRodClamp(recess=false);
//translate([0, 3*width, 0]) yRodClamp(recess=false);

module yRodClamp(recess=false){
difference(){
	union(){
		translate([-width/2, 0, smoothRod/2]) rotate([0,90,0]) cylinder(r=thickness+smoothRod/2, h=width);
		hull(){
			translate([0, width/2, 0]) cylinder(r=width/2, h=width/2);
			translate([0, -width/2, 0]) cylinder(r=width/2, h=width/2);
		}
	}
	translate([-1-width/2, 0, smoothRod/2]) rotate([0,90,0]) cylinder(r=smoothRod/2, h=width+2);
	translate([-1-width/2, -smoothRod/2, -1]) cube([100+width+2, smoothRod, smoothRod/2+1]);
	if(recess==true){// recesses the holes for washers. This makes weaker parts prone to splitting but is truer to the original
		translate([0,  width-thickness-2, thickness]) boltWasher("z+");
		translate([0,  -width+thickness+2, thickness]) boltWasher("z+");
	} else {
		translate([0,  width-thickness-2, width/2]) boltWasher("z+");
		translate([0,  -width+thickness+2, width/2]) boltWasher("z+");
	} 
	translate([0, 0, -50]) cube([100, 100, 100], center=true);
}
}
